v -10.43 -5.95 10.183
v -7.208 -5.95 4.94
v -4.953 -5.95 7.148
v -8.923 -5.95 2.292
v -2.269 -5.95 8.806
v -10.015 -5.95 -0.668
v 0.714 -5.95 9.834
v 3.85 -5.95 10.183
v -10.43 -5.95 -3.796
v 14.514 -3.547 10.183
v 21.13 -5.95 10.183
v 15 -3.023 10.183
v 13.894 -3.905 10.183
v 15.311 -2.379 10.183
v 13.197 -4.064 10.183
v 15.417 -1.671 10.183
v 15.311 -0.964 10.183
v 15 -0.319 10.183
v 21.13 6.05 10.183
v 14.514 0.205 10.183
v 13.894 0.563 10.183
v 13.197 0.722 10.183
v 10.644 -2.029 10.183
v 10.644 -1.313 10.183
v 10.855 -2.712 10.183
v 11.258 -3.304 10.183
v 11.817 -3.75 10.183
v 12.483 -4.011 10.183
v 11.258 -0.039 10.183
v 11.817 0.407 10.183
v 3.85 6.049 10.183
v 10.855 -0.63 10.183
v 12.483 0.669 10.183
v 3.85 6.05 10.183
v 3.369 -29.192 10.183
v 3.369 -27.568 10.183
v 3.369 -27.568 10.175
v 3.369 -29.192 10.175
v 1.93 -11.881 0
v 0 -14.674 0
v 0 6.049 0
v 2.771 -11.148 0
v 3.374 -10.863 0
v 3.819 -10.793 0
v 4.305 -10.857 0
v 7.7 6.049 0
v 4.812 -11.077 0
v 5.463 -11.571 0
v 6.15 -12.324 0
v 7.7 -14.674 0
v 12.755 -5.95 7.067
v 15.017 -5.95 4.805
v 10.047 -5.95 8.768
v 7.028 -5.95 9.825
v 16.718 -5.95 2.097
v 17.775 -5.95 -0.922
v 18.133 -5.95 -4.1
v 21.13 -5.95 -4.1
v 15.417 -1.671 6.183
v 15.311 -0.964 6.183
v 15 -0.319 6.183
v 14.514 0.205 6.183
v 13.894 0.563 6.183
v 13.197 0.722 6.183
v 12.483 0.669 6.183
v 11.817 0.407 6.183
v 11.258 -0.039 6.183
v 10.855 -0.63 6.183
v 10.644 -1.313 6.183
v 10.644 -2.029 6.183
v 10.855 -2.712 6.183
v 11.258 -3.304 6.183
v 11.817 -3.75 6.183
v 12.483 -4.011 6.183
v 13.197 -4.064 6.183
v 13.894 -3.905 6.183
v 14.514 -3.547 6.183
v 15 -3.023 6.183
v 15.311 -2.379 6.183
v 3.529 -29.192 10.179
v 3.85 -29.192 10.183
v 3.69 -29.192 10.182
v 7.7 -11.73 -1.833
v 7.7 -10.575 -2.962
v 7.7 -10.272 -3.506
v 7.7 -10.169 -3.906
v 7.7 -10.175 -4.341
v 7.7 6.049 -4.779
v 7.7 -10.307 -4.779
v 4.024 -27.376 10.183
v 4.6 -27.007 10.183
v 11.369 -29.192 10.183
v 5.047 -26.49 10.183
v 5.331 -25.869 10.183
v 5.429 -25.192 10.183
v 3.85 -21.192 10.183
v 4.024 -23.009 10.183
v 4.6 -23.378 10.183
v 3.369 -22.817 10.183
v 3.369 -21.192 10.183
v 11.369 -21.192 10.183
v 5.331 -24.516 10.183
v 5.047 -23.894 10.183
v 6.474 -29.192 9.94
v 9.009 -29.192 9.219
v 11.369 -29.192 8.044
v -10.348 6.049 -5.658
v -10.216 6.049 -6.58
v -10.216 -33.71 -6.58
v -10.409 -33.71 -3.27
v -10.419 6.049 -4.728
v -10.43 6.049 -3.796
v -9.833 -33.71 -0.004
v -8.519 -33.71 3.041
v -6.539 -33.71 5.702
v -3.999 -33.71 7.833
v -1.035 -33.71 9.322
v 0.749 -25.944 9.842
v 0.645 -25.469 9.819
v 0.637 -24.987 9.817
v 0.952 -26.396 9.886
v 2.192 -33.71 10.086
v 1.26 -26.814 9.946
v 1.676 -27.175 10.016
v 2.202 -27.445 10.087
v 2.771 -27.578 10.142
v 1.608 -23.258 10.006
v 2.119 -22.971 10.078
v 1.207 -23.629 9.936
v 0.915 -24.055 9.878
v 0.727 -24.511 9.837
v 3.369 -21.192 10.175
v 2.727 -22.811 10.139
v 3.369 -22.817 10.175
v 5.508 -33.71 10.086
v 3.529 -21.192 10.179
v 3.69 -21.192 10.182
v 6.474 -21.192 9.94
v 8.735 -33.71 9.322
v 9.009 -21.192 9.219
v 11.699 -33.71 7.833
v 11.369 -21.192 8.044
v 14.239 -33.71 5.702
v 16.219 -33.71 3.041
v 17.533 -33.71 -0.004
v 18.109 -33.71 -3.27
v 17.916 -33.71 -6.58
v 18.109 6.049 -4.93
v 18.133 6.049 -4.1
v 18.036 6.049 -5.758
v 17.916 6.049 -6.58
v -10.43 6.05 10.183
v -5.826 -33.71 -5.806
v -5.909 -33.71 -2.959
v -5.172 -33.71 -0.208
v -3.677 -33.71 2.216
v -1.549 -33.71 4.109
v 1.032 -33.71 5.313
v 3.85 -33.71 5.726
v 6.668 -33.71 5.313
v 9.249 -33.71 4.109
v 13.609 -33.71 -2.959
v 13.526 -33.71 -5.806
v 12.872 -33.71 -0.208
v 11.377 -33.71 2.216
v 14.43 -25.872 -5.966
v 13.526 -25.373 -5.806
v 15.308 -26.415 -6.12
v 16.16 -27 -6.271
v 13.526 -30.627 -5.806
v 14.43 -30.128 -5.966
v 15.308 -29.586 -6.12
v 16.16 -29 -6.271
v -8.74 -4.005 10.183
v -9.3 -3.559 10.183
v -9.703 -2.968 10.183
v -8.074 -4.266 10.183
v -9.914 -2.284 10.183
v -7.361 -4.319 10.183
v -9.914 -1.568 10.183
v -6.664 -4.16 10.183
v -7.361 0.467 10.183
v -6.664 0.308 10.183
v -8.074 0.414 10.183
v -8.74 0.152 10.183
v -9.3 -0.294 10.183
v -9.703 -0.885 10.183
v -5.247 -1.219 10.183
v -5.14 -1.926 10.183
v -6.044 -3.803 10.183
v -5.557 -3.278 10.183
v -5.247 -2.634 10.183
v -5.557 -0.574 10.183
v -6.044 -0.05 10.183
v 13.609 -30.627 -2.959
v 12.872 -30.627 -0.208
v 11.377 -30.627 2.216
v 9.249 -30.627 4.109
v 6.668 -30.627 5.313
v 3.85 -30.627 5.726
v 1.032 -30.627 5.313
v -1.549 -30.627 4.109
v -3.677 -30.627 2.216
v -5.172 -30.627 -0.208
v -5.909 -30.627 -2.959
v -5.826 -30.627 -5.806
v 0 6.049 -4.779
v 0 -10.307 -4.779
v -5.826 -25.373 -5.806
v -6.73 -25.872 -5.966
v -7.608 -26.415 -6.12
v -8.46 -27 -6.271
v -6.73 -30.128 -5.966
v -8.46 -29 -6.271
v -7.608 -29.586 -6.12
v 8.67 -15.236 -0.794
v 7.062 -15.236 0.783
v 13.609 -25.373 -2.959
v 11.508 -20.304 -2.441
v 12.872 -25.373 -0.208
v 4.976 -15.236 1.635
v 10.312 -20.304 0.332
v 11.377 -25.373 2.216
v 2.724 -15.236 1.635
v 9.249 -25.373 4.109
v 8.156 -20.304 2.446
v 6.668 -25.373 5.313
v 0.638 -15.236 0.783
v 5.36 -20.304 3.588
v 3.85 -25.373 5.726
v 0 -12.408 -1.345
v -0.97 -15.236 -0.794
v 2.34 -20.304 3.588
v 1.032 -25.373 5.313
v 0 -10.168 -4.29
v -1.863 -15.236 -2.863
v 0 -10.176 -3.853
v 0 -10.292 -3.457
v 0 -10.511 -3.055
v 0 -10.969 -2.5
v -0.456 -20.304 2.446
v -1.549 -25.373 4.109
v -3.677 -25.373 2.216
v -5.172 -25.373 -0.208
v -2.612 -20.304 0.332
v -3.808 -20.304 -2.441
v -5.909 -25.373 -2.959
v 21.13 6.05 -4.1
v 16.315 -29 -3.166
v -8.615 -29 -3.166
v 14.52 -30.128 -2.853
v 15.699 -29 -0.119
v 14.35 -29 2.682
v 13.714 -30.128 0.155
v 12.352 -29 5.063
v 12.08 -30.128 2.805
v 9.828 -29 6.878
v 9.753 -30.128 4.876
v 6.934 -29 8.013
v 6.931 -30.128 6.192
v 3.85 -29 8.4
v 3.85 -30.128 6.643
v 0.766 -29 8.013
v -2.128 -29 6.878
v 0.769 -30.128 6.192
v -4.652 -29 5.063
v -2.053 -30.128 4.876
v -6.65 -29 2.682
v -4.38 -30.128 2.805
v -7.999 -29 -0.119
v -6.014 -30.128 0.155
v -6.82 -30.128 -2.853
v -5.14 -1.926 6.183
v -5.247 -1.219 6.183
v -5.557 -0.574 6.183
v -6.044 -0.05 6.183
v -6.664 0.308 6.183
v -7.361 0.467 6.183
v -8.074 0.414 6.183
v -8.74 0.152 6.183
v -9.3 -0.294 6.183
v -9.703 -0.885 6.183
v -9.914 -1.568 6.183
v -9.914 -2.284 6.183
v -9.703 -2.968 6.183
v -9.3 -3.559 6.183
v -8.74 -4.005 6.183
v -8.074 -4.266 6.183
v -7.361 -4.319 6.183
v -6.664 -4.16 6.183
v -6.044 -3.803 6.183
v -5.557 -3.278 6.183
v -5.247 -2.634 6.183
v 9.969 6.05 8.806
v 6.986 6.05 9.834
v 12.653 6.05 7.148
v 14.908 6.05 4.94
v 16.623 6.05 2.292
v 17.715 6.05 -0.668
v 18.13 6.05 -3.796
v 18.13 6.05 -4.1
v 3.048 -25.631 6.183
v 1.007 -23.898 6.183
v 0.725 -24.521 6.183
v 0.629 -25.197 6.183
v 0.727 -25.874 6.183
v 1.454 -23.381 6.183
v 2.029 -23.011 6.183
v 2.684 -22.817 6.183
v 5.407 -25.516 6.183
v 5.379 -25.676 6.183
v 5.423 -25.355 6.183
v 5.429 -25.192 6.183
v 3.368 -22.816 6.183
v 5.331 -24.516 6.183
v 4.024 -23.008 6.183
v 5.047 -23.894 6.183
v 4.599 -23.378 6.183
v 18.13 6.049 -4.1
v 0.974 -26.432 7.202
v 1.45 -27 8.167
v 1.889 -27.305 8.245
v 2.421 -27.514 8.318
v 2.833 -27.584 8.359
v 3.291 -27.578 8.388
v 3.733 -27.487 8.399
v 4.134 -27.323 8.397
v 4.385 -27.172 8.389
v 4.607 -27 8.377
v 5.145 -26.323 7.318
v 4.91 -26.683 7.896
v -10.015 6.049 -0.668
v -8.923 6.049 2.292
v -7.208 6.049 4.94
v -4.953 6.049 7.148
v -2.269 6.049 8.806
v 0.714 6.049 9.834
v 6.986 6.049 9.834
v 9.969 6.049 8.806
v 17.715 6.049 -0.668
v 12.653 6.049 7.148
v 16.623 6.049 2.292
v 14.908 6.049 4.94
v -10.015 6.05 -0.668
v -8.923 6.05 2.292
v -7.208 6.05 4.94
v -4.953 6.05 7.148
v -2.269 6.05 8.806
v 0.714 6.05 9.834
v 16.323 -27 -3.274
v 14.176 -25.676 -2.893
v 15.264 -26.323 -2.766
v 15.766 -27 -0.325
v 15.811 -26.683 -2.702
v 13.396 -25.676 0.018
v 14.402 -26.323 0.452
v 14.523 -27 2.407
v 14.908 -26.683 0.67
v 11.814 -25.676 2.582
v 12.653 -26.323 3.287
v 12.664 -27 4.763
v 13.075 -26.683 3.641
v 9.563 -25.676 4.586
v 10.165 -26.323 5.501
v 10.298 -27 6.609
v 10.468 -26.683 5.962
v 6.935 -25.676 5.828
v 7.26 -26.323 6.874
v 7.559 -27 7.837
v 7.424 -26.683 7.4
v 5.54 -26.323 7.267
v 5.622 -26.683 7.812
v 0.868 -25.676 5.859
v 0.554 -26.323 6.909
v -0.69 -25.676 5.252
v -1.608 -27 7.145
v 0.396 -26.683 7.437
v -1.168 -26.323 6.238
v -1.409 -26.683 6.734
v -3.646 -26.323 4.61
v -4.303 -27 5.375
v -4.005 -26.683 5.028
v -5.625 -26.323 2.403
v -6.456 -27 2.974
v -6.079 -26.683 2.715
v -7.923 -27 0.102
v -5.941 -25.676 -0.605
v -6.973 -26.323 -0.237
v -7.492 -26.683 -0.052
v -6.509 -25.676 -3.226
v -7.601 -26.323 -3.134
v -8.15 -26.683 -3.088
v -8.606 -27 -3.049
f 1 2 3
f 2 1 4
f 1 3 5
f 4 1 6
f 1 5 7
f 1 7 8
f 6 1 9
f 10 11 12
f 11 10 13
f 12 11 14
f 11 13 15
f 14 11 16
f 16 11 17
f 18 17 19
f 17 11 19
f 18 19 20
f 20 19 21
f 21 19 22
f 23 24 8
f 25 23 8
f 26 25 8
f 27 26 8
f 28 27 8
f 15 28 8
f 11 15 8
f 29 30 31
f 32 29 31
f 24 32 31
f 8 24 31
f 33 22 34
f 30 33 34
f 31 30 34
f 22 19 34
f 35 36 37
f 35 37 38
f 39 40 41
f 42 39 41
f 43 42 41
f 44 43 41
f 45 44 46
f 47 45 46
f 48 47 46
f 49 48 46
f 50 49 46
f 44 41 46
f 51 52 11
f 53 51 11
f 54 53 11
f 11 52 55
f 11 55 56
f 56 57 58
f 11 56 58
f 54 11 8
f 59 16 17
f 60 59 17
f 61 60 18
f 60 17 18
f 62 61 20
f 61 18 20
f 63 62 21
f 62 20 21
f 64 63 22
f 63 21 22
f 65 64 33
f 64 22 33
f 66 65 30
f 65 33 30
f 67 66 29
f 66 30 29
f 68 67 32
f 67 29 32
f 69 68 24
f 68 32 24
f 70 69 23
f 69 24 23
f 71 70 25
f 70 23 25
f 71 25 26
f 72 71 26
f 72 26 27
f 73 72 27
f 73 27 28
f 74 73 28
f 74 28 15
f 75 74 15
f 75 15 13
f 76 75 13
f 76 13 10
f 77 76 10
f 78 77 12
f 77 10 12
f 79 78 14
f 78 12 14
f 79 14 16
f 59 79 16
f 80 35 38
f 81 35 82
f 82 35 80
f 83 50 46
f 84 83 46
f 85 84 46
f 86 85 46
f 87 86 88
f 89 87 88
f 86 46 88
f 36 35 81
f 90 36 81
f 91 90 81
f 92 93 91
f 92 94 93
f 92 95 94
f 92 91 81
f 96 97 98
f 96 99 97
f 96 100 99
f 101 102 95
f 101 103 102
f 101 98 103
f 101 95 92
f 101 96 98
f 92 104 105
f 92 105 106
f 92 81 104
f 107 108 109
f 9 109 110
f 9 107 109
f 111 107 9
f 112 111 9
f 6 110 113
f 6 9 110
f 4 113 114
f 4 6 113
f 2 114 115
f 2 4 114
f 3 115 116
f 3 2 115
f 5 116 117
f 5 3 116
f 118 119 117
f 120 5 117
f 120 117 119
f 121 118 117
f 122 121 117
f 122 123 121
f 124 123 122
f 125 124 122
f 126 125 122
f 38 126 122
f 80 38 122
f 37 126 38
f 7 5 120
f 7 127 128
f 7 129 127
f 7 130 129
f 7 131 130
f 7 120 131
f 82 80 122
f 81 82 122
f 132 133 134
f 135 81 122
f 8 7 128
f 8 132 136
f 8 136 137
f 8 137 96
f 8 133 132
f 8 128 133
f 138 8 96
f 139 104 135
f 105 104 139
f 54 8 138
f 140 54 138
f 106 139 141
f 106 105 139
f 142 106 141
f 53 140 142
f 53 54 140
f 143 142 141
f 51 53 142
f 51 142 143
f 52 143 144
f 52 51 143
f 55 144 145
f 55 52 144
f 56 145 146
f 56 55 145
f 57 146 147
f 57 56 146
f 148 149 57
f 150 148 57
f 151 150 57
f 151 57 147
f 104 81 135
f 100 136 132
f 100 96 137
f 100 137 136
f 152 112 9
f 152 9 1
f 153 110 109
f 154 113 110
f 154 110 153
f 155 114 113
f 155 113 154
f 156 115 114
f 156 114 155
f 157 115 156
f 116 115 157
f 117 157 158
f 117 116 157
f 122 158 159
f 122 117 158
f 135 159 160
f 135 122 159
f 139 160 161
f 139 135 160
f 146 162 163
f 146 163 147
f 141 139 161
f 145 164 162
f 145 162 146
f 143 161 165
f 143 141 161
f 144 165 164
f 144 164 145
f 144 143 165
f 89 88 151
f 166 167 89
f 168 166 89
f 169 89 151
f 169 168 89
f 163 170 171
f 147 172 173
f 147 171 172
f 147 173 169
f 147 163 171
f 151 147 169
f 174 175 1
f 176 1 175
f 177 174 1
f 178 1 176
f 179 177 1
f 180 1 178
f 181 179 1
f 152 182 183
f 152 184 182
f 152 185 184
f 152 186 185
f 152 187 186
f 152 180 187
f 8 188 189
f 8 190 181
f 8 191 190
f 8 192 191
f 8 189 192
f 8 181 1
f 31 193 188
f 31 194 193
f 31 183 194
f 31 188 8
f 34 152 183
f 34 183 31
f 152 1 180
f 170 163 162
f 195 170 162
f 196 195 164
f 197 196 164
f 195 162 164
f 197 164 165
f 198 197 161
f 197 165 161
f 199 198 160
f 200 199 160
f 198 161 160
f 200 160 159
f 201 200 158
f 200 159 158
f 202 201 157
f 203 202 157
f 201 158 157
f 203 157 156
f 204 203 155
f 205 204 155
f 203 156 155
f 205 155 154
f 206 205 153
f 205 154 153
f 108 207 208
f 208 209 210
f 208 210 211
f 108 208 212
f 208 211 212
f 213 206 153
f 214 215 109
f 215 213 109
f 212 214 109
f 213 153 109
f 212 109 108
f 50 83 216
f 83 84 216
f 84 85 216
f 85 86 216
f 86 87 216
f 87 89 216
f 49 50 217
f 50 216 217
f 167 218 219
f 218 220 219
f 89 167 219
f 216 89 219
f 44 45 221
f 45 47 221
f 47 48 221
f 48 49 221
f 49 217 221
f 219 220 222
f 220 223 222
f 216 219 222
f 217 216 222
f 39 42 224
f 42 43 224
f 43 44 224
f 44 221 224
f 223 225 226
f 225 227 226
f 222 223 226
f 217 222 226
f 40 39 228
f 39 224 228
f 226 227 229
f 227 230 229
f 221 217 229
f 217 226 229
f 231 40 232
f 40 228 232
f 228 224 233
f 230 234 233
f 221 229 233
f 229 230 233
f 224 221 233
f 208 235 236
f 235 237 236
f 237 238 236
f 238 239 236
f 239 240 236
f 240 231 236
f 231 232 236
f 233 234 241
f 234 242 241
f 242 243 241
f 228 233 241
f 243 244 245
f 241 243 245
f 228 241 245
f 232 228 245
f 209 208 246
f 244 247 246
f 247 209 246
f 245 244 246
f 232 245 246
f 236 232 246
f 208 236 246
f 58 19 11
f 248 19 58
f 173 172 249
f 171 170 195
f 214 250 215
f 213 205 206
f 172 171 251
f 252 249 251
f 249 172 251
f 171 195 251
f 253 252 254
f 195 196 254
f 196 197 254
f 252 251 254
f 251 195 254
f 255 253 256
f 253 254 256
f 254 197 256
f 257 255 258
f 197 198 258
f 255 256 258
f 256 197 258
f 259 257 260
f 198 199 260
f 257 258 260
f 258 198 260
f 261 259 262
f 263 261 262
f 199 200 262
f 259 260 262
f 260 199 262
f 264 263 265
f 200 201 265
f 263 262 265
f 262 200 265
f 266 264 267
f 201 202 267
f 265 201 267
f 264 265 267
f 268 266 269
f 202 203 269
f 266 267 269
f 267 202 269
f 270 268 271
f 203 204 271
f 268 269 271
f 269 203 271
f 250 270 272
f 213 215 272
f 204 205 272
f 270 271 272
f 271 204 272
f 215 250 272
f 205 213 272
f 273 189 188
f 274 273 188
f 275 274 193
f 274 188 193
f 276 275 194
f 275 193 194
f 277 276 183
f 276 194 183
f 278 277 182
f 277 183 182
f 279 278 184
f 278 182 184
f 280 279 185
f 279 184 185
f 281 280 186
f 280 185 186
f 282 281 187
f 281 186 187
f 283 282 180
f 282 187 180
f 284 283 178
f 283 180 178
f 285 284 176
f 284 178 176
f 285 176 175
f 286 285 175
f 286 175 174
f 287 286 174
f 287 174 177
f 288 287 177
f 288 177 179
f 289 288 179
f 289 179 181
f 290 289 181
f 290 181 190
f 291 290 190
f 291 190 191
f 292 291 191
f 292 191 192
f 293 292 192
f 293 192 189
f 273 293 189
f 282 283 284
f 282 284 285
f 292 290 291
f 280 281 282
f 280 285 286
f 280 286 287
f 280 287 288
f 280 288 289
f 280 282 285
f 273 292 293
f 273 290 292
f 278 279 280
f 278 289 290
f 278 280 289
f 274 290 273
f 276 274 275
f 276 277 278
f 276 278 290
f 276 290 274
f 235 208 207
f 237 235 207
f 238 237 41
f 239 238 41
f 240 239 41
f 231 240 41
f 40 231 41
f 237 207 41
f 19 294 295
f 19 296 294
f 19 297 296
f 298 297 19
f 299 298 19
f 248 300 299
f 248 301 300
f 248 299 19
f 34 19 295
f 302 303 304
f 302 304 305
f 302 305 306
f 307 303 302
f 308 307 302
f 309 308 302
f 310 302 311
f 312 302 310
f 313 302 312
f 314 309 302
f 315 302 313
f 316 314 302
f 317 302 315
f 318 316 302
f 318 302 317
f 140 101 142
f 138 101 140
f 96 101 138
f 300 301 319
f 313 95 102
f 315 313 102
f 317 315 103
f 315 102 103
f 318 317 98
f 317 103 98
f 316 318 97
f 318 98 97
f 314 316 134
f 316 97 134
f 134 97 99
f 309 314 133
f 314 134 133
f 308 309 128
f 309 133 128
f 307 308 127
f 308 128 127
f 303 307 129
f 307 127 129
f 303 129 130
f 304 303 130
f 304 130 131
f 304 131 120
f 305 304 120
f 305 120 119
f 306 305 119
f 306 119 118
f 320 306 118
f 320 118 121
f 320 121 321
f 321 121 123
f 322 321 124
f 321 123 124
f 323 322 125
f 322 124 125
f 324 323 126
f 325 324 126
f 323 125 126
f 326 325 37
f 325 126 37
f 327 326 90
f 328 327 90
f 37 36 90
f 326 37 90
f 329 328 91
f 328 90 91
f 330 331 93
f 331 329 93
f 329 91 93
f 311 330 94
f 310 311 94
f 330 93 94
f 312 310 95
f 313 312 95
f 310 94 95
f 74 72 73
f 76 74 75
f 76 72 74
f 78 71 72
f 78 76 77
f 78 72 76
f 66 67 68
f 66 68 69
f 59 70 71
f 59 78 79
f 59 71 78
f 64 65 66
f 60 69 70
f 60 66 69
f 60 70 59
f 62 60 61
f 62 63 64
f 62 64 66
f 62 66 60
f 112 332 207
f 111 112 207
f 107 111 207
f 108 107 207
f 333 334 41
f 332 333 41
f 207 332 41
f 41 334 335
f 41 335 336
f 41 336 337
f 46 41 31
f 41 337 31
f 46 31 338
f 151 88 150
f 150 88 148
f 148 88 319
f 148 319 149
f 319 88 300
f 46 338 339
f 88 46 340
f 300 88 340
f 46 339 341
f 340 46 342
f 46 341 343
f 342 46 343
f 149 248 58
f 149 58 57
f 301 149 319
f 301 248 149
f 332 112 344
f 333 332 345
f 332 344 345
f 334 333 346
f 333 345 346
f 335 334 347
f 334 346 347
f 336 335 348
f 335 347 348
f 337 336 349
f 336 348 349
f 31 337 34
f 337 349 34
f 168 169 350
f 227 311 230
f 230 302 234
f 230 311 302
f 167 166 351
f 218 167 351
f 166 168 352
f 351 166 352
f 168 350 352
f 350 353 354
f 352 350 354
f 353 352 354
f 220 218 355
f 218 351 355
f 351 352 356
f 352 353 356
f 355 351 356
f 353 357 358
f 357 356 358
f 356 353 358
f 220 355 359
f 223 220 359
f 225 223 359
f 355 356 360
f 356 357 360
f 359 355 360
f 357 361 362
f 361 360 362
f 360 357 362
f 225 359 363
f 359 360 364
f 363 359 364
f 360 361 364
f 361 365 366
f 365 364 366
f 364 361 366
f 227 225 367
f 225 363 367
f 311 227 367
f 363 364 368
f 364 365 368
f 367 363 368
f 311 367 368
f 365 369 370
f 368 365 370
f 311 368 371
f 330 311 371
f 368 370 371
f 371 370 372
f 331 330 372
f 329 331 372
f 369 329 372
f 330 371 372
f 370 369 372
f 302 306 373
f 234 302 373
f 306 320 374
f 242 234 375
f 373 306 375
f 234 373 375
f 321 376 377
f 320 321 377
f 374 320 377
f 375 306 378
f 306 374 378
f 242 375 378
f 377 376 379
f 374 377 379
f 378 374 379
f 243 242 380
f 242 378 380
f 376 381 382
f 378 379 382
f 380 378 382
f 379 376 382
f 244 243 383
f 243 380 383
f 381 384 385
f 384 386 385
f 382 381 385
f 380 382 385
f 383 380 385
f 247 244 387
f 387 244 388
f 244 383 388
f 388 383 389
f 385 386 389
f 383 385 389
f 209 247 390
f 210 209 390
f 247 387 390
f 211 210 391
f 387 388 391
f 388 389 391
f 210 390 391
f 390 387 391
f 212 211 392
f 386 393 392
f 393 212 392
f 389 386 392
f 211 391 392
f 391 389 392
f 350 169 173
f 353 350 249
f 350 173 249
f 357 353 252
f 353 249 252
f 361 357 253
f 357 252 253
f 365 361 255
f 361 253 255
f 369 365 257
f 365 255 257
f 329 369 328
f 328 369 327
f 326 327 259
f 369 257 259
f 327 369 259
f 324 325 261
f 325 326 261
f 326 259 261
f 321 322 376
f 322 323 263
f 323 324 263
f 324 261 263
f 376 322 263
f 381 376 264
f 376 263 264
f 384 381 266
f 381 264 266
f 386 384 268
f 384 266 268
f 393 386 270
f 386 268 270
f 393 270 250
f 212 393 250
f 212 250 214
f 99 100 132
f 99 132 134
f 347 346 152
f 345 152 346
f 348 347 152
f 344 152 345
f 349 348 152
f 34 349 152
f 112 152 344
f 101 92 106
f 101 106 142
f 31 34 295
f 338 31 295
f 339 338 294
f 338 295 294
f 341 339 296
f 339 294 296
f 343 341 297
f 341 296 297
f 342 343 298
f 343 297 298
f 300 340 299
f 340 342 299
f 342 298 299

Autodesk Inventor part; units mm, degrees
ref_plane "YZ Plane" through (0, 0, 0) normal (1, 0, 0) x (0, 1, 0)
ref_plane "XZ Plane" through (0, 0, 0) normal (0, 1, 0) x (-1, 0, 0)
ref_plane "XY Plane" through (0, 0, 0) normal (0, 0, 1) x (1, 0, 0)
ref_plane "Work Plane1" through (3.85, 70.2125, 8.85) normal (1, 0, 0) x (0, 0, 1)
sketch "Sketch1" plane through (3.85, 70.2125, 8.85) normal (1, 0, 0) x (0, 0, 1)
  line L0 (-8.85, 70.2125) -> (-17.05, 70.2125) construction
  line L1 (-17.05, 70.2125) -> (-17.05, 65.2125) construction
  line L2 (-8.85, 65.2125) -> (-17.05, 65.2125) construction
  line L3 (-8.85, 70.2125) -> (-8.85, 65.2125) construction
  arc A0 (-25.45, 97.2125) -> (-0.45, 97.2125) centre (-12.95, 114.7438) ccw construction
  arc A1 (-0.45, 99.2125) -> (-25.45, 99.2125) centre (-12.95, 81.6813) ccw construction
  line L4 (-0.45, 99.2125) -> (-0.45, 97.2125) construction
  line L5 (-25.45, 99.2125) -> (-25.45, 97.2125) construction
  line L6 (-12.95, -45.926) -> (-12.95, 188.756) construction
  line L7 (-10.1686, 64.1631) -> (-10.1686, 77.6475)
  line L8 (-10.1686, 77.6475) -> (-3.1244, 95.5852)
  line L9 (-3.1244, 100.8399) -> (-3.1244, 103.9225)
  line L10 (-3.1244, 103.9225) -> (1.3329, 103.9225)
  line L11 (1.3329, 103.9225) -> (1.3329, 64.1631)
  line L12 (1.3329, 64.1631) -> (-10.1686, 64.1631)
  arc A2 (-3.1244, 95.5852) -> (-0.45, 97.2125) centre (-12.95, 114.7438) ccw
  arc A3 (-0.45, 99.2125) -> (-3.1244, 100.8399) centre (-12.95, 81.6813) ccw
  line L13 (-0.45, 97.2125) -> (-0.45, 99.2125)
revolve "Revolution1" add sketch "Sketch1" angle 200 mid plane about axis through (3.85, 116.1385, -4.1) along (0, -1, 0)
sketch "Sketch2" plane through (3.85, 6.0495, -4.1) normal (0, 1, 0) x (1, 0, 0)
  circle A0 centre (0, 0) radius 2.8472 projected
  line L0 (-3.85, -4.1) -> (3.85, -4.1) projected
  line L1 (3.85, -4.1) -> (3.85, 4.1) projected
  line L2 (3.85, 4.1) -> (-3.85, 4.1) projected
  line L3 (-3.85, 4.1) -> (-3.85, -4.1) projected
  line L4 (-3.55, -3.8) -> (3.55, -3.8)
  line L5 (3.55, -3.8) -> (3.55, 3.8)
  line L6 (3.55, 3.8) -> (-3.55, 3.8)
  line L7 (-3.55, 3.8) -> (-3.55, -3.8)
  dimension "d1" = 0.3
extrude "Extrusion1" cut sketch "Sketch2" against normal through all contours A0 | L3 L2 L1 L0 | L7 L6 L5 L4
sketch "Sketch3" plane through (3.85, 6.0495, -4.1) normal (0, 1, 0) x (1, 0, 0)
  arc A0 (-14.0659, 2.4802) -> (14.0659, 2.4802) centre (0, 0) ccw projected
  line L0 (-14.2797, -0.3038) -> (-14.2797, -14.2829)
  line L1 (-14.2797, -0.3038) -> (-0.3006, -0.3038) construction
  line L2 (-14.2797, -14.2829) -> (0, -14.2829)
  line L3 (14.2797, -0.3038) -> (14.2797, -14.2829)
  line L4 (14.2797, -14.2829) -> (0, -14.2829)
  line L5 (14.2797, -14.2829) -> (17.2797, -14.2829)
  line L6 (17.2797, -14.2829) -> (17.2797, 0)
  line L7 (17.2797, 0) -> (14.2797, 0)
  line L8 (14.2797, 0) -> (14.2797, -14.2829)
  point P0 (-3.85, -4.1)
  dimension "d4" = 90
  dimension "d11" = 3
extrude "Extrusion2" add sketch "Sketch3" against normal blind 12
sketch "Sketch6" plane through (-10.4297, 6.0495, 10.1829) normal (0, 0, 1) x (1, 0, 0)
  line L0 (13.7983, -35.2418) -> (21.7983, -35.2418)
  line L1 (21.7983, -35.2418) -> (21.7983, -27.2418)
  line L2 (21.7983, -27.2418) -> (13.7983, -27.2418)
  line L3 (13.7983, -27.2418) -> (13.7983, -35.2418)
  line L4 (13.7983, -35.2418) -> (21.7983, -27.2418)
  line L5 (21.7983, -35.2418) -> (13.7983, -27.2418)
  circle A0 centre (13.4583, -31.2418) radius 1.4 projected
  point P0 (10.4297, -6.0495)
  point P1 (17.7983, -31.2418)
  dimension "d12" = 8
  dimension "d13" = 8
extrude "Extrusion3" add sketch "Sketch6" against normal up to surface
sketch "Sketch7" plane through (-10.4297, 6.0495, 10.1829) normal (0, 0, 1) x (1, 0, 0)
  circle A0 centre (23.447, -7.7206) radius 1.4 construction
  circle A1 centre (2.8893, -7.9757) radius 1.4 construction
  circle A2 centre (13.4583, -31.2418) radius 1.4 construction
  circle A3 centre (13.4583, -31.2418) radius 2.4
  circle A4 centre (23.447, -7.7206) radius 2.4
  circle A5 centre (2.8893, -7.9757) radius 2.4
  point P0 (10.4297, -6.0495)
  dimension "d16" = 4.8
  dimension "d17" = 4.8
  dimension "d18" = 4.8
extrude "Extrusion4" cut sketch "Sketch7" against normal blind 4
properties part number "30_CUBE_OpenSIM_Beamexpander_v2"
